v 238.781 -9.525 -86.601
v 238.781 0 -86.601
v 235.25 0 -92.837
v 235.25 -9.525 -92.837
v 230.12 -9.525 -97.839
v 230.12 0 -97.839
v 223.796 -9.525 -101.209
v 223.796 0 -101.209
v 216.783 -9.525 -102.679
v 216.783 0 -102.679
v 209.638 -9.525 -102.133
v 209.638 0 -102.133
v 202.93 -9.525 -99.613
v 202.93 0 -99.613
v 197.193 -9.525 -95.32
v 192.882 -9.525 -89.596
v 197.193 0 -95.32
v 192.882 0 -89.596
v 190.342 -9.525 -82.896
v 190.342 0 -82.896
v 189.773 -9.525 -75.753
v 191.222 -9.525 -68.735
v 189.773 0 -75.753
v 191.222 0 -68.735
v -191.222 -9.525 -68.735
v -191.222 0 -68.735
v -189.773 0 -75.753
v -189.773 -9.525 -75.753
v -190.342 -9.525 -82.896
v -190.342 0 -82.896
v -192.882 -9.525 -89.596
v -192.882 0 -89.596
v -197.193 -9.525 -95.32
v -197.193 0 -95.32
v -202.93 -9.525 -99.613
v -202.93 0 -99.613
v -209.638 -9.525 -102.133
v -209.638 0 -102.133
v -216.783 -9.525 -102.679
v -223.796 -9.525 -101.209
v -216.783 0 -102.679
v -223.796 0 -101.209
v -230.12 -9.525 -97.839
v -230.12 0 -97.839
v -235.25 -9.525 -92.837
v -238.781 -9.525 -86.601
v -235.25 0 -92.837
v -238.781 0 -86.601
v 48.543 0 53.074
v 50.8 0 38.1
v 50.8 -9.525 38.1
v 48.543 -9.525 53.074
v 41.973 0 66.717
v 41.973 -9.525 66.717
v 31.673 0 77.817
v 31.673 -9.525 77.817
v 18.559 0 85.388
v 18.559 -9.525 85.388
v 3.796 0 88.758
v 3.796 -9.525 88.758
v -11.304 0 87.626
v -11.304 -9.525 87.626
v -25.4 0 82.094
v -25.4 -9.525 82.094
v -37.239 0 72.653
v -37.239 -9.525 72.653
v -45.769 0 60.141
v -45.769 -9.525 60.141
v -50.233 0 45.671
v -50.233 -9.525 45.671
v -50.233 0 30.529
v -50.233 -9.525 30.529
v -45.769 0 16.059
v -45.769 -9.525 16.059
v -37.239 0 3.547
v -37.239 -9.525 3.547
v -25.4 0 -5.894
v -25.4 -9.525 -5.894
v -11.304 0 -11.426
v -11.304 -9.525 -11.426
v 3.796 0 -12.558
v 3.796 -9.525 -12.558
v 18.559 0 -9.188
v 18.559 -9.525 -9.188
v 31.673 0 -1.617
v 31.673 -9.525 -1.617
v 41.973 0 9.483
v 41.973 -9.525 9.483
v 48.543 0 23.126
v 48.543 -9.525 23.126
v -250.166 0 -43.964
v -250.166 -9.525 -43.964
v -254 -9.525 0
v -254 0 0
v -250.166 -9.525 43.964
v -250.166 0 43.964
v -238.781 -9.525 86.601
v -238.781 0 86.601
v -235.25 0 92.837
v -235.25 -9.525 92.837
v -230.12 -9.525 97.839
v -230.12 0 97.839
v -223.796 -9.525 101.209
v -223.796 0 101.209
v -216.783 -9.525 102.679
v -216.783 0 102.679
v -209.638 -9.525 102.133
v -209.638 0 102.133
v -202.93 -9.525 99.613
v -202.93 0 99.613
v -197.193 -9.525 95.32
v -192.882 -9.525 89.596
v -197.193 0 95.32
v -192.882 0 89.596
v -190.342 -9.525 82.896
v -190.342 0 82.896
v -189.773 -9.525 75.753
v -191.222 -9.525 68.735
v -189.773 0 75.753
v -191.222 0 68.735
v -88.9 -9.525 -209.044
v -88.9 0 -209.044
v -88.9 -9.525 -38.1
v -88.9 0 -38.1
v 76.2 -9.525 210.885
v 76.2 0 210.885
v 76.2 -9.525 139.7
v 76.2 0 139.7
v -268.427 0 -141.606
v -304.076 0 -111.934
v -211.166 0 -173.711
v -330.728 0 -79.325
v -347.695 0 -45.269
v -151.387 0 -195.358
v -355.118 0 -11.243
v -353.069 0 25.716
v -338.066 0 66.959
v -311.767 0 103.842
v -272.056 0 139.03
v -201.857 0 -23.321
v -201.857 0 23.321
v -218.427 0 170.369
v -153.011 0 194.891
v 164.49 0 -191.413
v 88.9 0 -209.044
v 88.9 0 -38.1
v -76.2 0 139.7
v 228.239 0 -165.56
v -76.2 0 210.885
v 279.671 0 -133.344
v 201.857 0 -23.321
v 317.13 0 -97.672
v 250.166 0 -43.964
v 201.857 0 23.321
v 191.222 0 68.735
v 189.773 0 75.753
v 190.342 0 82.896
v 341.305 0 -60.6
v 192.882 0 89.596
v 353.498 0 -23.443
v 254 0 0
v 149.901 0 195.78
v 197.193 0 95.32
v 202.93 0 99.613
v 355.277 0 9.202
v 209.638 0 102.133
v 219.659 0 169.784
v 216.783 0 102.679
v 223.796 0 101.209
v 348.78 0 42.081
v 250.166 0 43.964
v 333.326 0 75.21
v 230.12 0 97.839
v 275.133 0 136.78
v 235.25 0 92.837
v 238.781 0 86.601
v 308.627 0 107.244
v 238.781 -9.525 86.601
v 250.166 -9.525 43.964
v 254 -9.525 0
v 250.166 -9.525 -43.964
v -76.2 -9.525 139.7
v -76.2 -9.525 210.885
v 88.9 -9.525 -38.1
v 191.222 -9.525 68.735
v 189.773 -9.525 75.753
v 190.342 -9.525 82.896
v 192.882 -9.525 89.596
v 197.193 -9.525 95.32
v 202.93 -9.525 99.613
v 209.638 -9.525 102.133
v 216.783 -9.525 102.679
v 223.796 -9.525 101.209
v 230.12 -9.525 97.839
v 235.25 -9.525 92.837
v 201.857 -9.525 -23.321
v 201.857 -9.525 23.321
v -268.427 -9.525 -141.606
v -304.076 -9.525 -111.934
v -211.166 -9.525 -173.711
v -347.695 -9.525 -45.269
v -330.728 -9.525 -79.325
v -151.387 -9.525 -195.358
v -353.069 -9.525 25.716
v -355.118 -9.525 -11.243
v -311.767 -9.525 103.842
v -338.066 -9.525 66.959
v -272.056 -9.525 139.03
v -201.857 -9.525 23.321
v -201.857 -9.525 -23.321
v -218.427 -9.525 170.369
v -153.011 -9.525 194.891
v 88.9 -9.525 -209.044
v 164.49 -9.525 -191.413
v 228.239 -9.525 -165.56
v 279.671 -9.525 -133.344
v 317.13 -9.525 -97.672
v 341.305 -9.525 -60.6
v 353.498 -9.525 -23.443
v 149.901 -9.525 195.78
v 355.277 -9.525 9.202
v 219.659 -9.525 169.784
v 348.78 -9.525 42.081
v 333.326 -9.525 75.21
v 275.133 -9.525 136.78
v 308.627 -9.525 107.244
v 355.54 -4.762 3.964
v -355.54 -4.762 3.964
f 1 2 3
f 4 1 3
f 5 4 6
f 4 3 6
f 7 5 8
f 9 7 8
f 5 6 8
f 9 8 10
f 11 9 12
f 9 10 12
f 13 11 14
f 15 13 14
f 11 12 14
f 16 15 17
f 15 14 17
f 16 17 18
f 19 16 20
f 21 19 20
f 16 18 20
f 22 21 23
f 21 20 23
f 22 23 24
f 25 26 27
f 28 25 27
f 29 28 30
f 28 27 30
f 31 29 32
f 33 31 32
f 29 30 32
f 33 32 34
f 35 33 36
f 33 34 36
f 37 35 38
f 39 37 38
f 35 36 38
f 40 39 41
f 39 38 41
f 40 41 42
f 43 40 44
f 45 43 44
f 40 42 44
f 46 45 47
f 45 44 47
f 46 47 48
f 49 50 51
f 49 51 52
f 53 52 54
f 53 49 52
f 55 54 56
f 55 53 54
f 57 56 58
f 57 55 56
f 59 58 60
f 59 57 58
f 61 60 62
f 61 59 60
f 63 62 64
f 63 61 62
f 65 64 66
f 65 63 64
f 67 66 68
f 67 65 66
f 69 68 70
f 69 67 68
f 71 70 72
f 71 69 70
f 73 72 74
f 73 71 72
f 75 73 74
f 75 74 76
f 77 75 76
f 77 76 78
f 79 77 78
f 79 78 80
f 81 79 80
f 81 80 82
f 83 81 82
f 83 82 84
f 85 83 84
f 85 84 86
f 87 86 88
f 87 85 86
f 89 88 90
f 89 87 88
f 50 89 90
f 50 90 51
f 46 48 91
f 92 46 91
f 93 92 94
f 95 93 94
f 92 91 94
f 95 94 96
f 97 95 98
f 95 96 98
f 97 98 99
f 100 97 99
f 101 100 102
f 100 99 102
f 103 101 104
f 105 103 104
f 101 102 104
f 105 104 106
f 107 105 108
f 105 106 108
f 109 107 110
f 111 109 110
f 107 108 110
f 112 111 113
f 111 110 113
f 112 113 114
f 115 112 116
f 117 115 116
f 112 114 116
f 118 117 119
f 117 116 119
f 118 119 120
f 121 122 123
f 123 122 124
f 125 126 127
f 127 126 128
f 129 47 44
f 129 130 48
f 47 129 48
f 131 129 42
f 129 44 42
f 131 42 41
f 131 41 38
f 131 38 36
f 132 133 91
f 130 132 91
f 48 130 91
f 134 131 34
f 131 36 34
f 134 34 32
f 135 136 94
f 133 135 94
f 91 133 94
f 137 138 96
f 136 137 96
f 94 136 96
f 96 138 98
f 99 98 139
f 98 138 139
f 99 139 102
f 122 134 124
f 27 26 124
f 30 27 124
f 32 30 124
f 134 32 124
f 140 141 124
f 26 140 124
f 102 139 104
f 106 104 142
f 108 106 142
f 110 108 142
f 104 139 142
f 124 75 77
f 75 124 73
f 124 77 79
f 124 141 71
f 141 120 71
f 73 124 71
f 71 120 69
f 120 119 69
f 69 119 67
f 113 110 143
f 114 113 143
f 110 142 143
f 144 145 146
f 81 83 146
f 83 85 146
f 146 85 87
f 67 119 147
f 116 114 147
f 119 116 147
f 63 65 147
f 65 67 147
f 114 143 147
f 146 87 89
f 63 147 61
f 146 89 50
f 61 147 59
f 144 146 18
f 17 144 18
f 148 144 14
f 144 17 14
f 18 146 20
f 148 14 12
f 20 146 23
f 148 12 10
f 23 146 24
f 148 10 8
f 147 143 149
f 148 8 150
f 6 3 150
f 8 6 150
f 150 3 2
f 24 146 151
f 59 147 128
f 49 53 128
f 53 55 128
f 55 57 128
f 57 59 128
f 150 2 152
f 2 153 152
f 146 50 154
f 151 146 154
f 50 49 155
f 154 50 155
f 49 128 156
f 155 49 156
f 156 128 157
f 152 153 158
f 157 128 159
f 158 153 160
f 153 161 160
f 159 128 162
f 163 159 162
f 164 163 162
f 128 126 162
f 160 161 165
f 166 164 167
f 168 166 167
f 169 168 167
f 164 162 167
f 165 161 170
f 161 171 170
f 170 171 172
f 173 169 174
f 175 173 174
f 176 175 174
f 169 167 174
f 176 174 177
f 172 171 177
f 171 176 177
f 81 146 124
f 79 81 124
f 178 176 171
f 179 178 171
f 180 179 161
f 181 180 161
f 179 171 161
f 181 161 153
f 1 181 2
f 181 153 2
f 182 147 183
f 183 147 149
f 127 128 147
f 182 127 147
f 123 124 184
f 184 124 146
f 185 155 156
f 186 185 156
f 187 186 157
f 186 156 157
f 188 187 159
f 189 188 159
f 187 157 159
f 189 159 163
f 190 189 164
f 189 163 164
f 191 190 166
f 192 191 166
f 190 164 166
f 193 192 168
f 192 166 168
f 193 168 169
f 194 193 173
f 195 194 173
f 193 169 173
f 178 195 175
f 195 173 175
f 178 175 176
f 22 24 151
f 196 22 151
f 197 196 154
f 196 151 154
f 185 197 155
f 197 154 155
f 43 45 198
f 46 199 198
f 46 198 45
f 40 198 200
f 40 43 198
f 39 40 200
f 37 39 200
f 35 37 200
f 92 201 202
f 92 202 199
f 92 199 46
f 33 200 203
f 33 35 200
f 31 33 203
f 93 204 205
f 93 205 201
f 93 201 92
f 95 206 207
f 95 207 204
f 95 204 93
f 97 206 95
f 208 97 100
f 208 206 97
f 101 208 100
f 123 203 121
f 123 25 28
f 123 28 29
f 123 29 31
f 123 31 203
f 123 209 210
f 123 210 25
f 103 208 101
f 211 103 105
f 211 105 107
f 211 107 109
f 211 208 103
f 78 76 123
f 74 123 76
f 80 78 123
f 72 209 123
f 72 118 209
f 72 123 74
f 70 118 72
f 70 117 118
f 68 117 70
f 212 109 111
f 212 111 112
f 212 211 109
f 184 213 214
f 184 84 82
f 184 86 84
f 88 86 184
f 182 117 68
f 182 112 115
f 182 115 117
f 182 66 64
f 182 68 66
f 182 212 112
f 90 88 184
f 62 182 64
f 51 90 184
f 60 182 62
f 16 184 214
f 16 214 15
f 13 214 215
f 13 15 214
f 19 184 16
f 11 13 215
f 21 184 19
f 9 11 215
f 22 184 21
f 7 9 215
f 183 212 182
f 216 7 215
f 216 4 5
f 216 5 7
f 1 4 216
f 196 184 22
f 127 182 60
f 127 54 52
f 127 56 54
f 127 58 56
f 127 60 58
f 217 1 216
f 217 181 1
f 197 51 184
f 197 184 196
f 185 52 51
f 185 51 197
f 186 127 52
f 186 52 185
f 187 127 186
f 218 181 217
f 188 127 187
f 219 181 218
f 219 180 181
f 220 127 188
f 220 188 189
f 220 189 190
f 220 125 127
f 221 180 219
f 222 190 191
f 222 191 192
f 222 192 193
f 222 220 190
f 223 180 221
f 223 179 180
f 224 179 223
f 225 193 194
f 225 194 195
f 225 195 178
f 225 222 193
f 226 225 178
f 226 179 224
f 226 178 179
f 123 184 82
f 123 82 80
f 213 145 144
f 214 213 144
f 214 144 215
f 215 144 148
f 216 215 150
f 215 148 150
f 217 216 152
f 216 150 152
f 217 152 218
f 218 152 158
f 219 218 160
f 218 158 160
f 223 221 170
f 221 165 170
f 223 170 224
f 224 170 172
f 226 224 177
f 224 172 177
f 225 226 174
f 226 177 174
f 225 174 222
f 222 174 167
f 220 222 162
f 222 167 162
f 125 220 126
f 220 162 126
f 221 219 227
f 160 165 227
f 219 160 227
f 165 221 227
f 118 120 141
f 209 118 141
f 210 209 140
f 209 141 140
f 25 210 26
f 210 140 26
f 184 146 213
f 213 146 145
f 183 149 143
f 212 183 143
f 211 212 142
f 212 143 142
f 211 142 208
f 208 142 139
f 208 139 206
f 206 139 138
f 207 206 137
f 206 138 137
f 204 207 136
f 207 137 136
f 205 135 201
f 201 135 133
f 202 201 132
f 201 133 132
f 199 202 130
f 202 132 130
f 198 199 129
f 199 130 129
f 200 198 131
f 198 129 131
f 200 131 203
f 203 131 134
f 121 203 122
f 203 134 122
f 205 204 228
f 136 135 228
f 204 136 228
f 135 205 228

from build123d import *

# Parameters (mm, degrees)
F0_R     = 50.8
F1_DEPTH = 9.525


with BuildPart() as f1:
    # F0 (on Front) → F1 (new body)
    with BuildSketch(Plane.XZ):
        with BuildLine():
            Line((-76.2, 139.7), (-76.2, 210.8848640072))
            add(Edge.make_bspline(
                [(-76.2, 210.8848640072), (-350.3866084273, 174.3642911637), (-355.5400679477, 3.9636750181), (-360.6935274681, -166.4369411274), (-88.9, -209.0442761115)],
                knots=[4.9283494791, 4.9283494791, 4.9283494791, 6.264825429, 6.264825429, 7.6013013788, 7.6013013788, 7.6013013788], degree=2, weights=[1, 0.7849146414, 1, 0.7849146414, 1]))
            Line((-88.9, -209.0442761115), (-88.9, -38.1))
            Line((-88.9, -38.1), (88.9, -38.1))
            Line((88.9, -38.1), (88.9, -209.0442761115))
            add(Edge.make_bspline(
                [(88.9, -209.0442761115), (360.6935274681, -166.4369411274), (355.5400679477, 3.9636750181), (350.3866084273, 174.3642911637), (76.2, 210.8848640072)],
                knots=[1.8234765819, 1.8234765819, 1.8234765819, 3.1599525318, 3.1599525318, 4.4964284817, 4.4964284817, 4.4964284817], degree=2, weights=[1, 0.7849146414, 1, 0.7849146414, 1]))
            Line((76.2, 210.8848640072), (76.2, 139.7))
            Line((76.2, 139.7), (-76.2, 139.7))
        make_face()
        with BuildLine():
            ThreePointArc((-238.7806288296, -86.601450887), (-254, 0), (-238.7806288296, 86.601450887))
            ThreePointArc((-238.7806288296, 86.601450887), (-206.1948067036, 101.1107078148), (-191.2215304553, 68.7354805783))
            ThreePointArc((-191.2215304553, 68.7354805783), (-203.2, 0), (-191.2215304553, -68.7354805783))
            ThreePointArc((-191.2215304553, -68.7354805783), (-206.1948067036, -101.1107078148), (-238.7806288296, -86.601450887))
        make_face(mode=Mode.SUBTRACT)
        with BuildLine():
            ThreePointArc((238.7806288296, -86.601450887), (206.1948067036, -101.1107078148), (191.2215304553, -68.7354805783))
            ThreePointArc((191.2215304553, -68.7354805783), (203.2, 0), (191.2215304553, 68.7354805783))
            ThreePointArc((191.2215304553, 68.7354805783), (206.1948067036, 101.1107078148), (238.7806288296, 86.601450887))
            ThreePointArc((238.7806288296, 86.601450887), (254, 0), (238.7806288296, -86.601450887))
        make_face(mode=Mode.SUBTRACT)
        with Locations((0, 38.1)):
            Circle(F0_R, mode=Mode.SUBTRACT)
    extrude(amount=F1_DEPTH)


solid = f1.part
